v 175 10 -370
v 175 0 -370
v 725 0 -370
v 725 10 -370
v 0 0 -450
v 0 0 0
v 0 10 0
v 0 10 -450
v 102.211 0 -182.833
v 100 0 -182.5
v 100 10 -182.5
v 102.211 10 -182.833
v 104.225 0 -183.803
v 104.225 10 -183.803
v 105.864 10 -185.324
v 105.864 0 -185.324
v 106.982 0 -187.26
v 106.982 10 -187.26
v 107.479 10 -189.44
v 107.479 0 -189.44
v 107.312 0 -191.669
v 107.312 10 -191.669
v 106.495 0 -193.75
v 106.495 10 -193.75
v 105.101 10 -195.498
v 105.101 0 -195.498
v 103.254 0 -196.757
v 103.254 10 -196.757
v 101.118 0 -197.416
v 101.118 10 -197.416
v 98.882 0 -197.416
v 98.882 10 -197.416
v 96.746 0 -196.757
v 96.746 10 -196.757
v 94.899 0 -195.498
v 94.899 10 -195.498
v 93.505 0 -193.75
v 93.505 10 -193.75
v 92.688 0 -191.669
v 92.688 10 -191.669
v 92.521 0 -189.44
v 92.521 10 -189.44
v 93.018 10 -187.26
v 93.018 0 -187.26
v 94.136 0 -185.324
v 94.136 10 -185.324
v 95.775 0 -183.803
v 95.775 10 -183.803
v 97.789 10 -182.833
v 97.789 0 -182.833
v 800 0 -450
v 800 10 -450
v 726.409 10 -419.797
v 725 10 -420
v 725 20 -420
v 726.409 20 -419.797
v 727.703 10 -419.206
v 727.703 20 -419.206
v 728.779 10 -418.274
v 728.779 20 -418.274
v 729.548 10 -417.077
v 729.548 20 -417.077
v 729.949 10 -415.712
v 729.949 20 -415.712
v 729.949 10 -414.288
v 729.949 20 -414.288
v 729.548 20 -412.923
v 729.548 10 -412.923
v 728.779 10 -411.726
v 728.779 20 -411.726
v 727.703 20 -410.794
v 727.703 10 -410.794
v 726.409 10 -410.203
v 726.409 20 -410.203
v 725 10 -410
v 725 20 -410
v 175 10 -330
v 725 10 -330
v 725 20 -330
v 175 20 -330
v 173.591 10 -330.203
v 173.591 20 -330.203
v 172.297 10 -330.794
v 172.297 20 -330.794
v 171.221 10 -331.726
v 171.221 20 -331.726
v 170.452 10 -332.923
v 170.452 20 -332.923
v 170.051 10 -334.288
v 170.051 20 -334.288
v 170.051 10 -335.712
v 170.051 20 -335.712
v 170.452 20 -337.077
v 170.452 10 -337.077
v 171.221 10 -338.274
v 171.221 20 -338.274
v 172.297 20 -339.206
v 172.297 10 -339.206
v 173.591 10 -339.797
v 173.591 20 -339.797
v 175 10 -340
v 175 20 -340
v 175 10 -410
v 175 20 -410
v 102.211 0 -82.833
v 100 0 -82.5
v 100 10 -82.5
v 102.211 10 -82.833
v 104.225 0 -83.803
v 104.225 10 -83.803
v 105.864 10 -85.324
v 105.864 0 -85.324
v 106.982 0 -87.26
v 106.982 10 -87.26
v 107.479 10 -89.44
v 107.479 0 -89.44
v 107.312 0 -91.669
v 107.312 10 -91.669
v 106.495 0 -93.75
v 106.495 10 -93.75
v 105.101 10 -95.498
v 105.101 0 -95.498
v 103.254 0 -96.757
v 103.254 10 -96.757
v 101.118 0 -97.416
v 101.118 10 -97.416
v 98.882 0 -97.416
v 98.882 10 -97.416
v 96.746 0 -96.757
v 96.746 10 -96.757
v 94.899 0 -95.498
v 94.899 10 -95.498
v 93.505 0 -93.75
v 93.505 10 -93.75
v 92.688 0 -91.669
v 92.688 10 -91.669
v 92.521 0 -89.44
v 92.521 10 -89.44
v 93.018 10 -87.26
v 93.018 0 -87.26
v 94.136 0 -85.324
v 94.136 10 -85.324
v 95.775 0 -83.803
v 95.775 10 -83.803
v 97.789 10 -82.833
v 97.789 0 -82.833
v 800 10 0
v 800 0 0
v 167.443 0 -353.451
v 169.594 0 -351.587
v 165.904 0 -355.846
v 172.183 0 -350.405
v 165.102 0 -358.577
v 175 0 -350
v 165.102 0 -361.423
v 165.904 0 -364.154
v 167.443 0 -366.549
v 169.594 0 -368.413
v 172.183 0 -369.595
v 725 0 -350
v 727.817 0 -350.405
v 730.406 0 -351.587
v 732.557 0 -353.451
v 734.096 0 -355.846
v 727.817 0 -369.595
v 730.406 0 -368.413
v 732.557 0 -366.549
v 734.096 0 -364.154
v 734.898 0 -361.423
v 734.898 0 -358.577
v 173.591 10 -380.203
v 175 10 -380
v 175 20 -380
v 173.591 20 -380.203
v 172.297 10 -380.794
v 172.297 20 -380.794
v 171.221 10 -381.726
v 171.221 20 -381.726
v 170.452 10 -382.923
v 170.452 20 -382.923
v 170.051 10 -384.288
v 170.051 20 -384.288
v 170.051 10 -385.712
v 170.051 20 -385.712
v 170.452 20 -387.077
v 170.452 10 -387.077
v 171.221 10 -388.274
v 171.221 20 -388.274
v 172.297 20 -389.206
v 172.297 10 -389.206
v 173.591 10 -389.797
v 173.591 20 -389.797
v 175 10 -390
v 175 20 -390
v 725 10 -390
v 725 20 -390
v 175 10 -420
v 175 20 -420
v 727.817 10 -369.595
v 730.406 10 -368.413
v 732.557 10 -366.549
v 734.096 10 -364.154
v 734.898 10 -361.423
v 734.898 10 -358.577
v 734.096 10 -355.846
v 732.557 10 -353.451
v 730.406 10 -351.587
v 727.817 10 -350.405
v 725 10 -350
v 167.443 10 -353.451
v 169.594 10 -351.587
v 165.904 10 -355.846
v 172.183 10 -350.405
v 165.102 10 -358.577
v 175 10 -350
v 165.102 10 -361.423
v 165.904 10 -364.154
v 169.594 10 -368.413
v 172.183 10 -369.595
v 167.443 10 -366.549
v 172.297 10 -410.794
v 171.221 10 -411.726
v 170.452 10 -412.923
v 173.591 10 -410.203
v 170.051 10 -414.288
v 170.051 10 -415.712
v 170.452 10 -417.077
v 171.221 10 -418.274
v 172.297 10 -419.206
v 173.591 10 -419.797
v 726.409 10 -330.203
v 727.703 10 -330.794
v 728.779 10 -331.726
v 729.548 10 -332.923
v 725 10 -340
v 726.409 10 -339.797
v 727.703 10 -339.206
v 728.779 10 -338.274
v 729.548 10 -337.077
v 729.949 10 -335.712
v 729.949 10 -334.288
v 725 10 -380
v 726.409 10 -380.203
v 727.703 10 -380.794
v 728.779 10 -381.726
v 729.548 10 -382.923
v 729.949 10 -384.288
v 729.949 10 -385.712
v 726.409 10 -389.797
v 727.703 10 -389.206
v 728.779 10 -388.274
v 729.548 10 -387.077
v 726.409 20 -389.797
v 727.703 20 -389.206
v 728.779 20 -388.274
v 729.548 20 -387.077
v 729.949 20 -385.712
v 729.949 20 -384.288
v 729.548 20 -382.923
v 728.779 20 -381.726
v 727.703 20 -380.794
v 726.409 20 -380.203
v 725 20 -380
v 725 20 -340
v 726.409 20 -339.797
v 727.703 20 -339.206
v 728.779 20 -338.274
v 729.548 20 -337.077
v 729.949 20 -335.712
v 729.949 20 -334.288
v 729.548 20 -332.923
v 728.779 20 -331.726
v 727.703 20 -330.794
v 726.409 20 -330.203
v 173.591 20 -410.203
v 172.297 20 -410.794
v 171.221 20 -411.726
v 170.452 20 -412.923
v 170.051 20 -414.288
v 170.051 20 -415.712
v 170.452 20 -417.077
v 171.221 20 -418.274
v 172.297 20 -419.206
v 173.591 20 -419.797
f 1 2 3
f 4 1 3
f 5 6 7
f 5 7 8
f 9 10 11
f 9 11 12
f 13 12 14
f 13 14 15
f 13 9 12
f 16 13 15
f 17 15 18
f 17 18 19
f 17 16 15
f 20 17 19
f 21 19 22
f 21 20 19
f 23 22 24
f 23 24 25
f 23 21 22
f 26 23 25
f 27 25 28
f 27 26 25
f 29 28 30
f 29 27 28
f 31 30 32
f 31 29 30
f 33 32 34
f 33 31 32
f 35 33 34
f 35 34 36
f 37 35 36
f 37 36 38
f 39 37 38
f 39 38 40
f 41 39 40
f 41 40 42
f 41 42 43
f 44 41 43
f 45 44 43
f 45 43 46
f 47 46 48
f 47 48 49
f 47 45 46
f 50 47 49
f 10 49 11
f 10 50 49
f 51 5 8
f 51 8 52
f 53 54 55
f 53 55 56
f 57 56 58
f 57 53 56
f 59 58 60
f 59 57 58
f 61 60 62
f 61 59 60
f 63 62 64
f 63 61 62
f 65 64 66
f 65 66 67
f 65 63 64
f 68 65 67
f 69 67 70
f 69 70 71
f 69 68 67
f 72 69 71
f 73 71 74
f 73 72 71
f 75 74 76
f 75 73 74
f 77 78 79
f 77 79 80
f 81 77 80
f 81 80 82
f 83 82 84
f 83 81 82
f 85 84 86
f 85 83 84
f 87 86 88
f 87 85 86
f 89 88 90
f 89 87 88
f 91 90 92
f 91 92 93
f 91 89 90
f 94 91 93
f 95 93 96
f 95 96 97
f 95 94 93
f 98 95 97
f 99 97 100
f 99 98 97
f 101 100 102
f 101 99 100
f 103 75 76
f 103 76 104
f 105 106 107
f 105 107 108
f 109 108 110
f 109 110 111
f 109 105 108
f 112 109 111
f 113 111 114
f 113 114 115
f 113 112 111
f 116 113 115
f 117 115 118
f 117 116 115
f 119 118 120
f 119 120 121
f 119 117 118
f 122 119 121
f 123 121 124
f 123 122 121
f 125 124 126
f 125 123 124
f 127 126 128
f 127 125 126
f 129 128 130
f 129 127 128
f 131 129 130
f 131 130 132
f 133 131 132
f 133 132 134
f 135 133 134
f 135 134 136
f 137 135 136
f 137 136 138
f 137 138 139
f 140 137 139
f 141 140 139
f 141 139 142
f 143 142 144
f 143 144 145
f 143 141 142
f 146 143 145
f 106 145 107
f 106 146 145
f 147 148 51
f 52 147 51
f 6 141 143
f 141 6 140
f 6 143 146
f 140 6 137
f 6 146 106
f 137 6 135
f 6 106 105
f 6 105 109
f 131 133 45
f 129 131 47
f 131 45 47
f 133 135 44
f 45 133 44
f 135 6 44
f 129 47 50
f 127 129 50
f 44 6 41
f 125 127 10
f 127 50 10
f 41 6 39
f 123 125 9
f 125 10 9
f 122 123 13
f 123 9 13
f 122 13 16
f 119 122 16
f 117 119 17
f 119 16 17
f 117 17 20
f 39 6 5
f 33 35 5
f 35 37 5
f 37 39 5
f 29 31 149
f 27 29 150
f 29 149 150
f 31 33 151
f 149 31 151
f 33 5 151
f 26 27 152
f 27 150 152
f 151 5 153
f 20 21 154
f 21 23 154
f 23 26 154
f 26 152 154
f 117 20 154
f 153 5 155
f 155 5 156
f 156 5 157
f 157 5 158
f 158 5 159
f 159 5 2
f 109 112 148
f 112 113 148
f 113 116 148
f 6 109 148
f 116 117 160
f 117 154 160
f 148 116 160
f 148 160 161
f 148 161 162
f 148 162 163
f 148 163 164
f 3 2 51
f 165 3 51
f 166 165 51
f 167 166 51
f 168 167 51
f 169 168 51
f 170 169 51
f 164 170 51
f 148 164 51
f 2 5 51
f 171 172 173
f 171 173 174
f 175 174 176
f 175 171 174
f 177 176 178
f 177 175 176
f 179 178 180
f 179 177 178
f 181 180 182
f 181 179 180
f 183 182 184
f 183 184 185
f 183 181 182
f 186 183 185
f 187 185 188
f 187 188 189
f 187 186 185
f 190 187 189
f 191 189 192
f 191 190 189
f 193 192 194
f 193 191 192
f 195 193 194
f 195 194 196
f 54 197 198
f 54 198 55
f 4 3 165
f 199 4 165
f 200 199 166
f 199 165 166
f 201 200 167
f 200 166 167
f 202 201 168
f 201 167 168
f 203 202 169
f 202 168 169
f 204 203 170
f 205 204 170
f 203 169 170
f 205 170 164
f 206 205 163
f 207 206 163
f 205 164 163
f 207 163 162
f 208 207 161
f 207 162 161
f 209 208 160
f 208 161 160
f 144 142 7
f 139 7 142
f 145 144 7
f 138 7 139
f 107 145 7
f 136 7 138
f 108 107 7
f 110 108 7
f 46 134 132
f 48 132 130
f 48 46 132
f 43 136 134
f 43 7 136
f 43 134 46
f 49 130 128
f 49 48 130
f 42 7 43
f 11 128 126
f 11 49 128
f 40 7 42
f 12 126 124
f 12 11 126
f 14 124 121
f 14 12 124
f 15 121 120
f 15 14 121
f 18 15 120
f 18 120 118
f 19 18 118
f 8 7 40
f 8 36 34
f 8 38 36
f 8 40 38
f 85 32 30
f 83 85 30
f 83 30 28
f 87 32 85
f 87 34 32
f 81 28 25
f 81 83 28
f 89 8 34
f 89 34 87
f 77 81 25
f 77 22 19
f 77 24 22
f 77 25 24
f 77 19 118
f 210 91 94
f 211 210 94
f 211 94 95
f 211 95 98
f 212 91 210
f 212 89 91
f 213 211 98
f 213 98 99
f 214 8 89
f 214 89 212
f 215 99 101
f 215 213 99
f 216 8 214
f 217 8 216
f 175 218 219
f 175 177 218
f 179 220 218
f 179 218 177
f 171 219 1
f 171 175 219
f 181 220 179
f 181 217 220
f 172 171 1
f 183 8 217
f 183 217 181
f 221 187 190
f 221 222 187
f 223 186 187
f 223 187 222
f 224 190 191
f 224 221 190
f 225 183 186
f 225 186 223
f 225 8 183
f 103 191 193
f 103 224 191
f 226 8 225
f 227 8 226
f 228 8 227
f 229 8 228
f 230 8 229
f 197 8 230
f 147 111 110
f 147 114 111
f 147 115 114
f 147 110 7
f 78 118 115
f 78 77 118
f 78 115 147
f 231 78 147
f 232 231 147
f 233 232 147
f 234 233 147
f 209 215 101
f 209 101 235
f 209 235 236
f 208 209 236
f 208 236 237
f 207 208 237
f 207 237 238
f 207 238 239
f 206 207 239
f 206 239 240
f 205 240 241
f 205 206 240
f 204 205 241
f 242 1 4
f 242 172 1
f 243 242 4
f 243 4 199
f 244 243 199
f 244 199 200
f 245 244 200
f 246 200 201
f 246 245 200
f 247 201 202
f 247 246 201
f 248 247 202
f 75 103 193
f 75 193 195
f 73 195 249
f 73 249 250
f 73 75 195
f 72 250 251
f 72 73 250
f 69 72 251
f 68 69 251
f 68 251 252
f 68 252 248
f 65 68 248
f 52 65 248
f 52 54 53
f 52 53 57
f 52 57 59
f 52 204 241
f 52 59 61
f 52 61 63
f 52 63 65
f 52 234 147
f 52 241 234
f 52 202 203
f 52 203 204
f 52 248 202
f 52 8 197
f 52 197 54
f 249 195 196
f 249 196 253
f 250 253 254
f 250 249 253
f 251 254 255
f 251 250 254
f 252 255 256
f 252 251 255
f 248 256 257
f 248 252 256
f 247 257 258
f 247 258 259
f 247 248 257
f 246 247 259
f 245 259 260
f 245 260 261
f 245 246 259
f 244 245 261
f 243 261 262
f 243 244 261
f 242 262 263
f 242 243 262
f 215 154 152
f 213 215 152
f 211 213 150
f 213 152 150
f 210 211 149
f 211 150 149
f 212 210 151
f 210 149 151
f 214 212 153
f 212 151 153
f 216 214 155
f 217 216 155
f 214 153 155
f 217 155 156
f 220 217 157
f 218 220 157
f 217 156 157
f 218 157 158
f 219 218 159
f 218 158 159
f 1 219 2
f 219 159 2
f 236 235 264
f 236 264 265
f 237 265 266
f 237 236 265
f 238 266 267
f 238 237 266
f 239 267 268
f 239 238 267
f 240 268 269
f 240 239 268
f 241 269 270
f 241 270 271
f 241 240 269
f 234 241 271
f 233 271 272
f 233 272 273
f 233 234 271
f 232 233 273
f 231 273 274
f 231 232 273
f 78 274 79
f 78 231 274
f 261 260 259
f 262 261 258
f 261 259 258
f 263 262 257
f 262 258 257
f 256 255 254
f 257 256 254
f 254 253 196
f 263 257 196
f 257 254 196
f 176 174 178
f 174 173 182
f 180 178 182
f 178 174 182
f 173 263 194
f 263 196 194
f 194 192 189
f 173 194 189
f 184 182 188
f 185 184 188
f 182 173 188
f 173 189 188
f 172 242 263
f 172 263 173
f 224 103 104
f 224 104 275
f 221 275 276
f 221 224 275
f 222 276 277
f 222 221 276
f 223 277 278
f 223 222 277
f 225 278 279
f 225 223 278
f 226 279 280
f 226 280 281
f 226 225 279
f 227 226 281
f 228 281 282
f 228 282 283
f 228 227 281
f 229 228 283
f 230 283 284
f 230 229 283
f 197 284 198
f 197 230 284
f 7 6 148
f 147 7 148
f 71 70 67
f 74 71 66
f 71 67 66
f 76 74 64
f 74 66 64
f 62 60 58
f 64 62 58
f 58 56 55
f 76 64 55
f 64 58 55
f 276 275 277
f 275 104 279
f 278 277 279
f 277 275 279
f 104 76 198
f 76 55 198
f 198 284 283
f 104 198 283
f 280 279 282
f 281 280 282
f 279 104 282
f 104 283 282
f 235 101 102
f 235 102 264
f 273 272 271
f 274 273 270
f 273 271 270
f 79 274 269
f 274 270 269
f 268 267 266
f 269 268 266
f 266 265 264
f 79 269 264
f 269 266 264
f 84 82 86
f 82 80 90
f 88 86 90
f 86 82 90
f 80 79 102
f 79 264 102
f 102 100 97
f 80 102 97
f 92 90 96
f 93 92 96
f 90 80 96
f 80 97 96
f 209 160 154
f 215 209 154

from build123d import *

# Parameters (mm, degrees)
SKETCH1_W           = 800
SKETCH1_H           = 450
SKETCH1_R           = 7.5
BOSS_EXTRUDE1_DEPTH = 10
BOSS_EXTRUDE2_DEPTH = 10


with BuildPart() as part:
    # Sketch1 → Boss-Extrude1 (new body)
    with BuildSketch(Plane(origin=(0, 0, 0), x_dir=(1, 0, 0), z_dir=(0, 1, 0))):
        with Locations((400, 225)):
            Rectangle(SKETCH1_W, SKETCH1_H)
        with Locations(Location((100, 190, 0), (0, 0, 270))):
            Circle(SKETCH1_R, mode=Mode.SUBTRACT)
        with Locations(Location((100, 90, 0), (0, 0, 270))):
            Circle(SKETCH1_R, mode=Mode.SUBTRACT)
        with BuildLine():
            Line((175, 370), (725, 370))
            ThreePointArc((725, 370), (735, 360), (725, 350))
            Line((725, 350), (175, 350))
            ThreePointArc((175, 350), (165, 360), (175, 370))
        make_face(mode=Mode.SUBTRACT)
    extrude(amount=BOSS_EXTRUDE1_DEPTH)

    # Sketch2 → Boss-Extrude2 (add)
    with BuildSketch(Plane(origin=(0, 10, 0), x_dir=(1, 0, 0), z_dir=(0, 1, 0))):
        with BuildLine():
            Line((175, 390), (725, 390))
            ThreePointArc((725, 390), (730, 385), (725, 380))
            Line((725, 380), (175, 380))
            ThreePointArc((175, 380), (170, 385), (175, 390))
        make_face()
        with BuildLine():
            Line((175, 340), (725, 340))
            ThreePointArc((725, 340), (730, 335), (725, 330))
            Line((725, 330), (175, 330))
            ThreePointArc((175, 330), (170, 335), (175, 340))
        make_face()
        with BuildLine():
            Line((175, 420), (725, 420))
            ThreePointArc((725, 420), (730, 415), (725, 410))
            Line((725, 410), (175, 410))
            ThreePointArc((175, 410), (170, 415), (175, 420))
        make_face()
    extrude(amount=BOSS_EXTRUDE2_DEPTH)


solid = part.part
